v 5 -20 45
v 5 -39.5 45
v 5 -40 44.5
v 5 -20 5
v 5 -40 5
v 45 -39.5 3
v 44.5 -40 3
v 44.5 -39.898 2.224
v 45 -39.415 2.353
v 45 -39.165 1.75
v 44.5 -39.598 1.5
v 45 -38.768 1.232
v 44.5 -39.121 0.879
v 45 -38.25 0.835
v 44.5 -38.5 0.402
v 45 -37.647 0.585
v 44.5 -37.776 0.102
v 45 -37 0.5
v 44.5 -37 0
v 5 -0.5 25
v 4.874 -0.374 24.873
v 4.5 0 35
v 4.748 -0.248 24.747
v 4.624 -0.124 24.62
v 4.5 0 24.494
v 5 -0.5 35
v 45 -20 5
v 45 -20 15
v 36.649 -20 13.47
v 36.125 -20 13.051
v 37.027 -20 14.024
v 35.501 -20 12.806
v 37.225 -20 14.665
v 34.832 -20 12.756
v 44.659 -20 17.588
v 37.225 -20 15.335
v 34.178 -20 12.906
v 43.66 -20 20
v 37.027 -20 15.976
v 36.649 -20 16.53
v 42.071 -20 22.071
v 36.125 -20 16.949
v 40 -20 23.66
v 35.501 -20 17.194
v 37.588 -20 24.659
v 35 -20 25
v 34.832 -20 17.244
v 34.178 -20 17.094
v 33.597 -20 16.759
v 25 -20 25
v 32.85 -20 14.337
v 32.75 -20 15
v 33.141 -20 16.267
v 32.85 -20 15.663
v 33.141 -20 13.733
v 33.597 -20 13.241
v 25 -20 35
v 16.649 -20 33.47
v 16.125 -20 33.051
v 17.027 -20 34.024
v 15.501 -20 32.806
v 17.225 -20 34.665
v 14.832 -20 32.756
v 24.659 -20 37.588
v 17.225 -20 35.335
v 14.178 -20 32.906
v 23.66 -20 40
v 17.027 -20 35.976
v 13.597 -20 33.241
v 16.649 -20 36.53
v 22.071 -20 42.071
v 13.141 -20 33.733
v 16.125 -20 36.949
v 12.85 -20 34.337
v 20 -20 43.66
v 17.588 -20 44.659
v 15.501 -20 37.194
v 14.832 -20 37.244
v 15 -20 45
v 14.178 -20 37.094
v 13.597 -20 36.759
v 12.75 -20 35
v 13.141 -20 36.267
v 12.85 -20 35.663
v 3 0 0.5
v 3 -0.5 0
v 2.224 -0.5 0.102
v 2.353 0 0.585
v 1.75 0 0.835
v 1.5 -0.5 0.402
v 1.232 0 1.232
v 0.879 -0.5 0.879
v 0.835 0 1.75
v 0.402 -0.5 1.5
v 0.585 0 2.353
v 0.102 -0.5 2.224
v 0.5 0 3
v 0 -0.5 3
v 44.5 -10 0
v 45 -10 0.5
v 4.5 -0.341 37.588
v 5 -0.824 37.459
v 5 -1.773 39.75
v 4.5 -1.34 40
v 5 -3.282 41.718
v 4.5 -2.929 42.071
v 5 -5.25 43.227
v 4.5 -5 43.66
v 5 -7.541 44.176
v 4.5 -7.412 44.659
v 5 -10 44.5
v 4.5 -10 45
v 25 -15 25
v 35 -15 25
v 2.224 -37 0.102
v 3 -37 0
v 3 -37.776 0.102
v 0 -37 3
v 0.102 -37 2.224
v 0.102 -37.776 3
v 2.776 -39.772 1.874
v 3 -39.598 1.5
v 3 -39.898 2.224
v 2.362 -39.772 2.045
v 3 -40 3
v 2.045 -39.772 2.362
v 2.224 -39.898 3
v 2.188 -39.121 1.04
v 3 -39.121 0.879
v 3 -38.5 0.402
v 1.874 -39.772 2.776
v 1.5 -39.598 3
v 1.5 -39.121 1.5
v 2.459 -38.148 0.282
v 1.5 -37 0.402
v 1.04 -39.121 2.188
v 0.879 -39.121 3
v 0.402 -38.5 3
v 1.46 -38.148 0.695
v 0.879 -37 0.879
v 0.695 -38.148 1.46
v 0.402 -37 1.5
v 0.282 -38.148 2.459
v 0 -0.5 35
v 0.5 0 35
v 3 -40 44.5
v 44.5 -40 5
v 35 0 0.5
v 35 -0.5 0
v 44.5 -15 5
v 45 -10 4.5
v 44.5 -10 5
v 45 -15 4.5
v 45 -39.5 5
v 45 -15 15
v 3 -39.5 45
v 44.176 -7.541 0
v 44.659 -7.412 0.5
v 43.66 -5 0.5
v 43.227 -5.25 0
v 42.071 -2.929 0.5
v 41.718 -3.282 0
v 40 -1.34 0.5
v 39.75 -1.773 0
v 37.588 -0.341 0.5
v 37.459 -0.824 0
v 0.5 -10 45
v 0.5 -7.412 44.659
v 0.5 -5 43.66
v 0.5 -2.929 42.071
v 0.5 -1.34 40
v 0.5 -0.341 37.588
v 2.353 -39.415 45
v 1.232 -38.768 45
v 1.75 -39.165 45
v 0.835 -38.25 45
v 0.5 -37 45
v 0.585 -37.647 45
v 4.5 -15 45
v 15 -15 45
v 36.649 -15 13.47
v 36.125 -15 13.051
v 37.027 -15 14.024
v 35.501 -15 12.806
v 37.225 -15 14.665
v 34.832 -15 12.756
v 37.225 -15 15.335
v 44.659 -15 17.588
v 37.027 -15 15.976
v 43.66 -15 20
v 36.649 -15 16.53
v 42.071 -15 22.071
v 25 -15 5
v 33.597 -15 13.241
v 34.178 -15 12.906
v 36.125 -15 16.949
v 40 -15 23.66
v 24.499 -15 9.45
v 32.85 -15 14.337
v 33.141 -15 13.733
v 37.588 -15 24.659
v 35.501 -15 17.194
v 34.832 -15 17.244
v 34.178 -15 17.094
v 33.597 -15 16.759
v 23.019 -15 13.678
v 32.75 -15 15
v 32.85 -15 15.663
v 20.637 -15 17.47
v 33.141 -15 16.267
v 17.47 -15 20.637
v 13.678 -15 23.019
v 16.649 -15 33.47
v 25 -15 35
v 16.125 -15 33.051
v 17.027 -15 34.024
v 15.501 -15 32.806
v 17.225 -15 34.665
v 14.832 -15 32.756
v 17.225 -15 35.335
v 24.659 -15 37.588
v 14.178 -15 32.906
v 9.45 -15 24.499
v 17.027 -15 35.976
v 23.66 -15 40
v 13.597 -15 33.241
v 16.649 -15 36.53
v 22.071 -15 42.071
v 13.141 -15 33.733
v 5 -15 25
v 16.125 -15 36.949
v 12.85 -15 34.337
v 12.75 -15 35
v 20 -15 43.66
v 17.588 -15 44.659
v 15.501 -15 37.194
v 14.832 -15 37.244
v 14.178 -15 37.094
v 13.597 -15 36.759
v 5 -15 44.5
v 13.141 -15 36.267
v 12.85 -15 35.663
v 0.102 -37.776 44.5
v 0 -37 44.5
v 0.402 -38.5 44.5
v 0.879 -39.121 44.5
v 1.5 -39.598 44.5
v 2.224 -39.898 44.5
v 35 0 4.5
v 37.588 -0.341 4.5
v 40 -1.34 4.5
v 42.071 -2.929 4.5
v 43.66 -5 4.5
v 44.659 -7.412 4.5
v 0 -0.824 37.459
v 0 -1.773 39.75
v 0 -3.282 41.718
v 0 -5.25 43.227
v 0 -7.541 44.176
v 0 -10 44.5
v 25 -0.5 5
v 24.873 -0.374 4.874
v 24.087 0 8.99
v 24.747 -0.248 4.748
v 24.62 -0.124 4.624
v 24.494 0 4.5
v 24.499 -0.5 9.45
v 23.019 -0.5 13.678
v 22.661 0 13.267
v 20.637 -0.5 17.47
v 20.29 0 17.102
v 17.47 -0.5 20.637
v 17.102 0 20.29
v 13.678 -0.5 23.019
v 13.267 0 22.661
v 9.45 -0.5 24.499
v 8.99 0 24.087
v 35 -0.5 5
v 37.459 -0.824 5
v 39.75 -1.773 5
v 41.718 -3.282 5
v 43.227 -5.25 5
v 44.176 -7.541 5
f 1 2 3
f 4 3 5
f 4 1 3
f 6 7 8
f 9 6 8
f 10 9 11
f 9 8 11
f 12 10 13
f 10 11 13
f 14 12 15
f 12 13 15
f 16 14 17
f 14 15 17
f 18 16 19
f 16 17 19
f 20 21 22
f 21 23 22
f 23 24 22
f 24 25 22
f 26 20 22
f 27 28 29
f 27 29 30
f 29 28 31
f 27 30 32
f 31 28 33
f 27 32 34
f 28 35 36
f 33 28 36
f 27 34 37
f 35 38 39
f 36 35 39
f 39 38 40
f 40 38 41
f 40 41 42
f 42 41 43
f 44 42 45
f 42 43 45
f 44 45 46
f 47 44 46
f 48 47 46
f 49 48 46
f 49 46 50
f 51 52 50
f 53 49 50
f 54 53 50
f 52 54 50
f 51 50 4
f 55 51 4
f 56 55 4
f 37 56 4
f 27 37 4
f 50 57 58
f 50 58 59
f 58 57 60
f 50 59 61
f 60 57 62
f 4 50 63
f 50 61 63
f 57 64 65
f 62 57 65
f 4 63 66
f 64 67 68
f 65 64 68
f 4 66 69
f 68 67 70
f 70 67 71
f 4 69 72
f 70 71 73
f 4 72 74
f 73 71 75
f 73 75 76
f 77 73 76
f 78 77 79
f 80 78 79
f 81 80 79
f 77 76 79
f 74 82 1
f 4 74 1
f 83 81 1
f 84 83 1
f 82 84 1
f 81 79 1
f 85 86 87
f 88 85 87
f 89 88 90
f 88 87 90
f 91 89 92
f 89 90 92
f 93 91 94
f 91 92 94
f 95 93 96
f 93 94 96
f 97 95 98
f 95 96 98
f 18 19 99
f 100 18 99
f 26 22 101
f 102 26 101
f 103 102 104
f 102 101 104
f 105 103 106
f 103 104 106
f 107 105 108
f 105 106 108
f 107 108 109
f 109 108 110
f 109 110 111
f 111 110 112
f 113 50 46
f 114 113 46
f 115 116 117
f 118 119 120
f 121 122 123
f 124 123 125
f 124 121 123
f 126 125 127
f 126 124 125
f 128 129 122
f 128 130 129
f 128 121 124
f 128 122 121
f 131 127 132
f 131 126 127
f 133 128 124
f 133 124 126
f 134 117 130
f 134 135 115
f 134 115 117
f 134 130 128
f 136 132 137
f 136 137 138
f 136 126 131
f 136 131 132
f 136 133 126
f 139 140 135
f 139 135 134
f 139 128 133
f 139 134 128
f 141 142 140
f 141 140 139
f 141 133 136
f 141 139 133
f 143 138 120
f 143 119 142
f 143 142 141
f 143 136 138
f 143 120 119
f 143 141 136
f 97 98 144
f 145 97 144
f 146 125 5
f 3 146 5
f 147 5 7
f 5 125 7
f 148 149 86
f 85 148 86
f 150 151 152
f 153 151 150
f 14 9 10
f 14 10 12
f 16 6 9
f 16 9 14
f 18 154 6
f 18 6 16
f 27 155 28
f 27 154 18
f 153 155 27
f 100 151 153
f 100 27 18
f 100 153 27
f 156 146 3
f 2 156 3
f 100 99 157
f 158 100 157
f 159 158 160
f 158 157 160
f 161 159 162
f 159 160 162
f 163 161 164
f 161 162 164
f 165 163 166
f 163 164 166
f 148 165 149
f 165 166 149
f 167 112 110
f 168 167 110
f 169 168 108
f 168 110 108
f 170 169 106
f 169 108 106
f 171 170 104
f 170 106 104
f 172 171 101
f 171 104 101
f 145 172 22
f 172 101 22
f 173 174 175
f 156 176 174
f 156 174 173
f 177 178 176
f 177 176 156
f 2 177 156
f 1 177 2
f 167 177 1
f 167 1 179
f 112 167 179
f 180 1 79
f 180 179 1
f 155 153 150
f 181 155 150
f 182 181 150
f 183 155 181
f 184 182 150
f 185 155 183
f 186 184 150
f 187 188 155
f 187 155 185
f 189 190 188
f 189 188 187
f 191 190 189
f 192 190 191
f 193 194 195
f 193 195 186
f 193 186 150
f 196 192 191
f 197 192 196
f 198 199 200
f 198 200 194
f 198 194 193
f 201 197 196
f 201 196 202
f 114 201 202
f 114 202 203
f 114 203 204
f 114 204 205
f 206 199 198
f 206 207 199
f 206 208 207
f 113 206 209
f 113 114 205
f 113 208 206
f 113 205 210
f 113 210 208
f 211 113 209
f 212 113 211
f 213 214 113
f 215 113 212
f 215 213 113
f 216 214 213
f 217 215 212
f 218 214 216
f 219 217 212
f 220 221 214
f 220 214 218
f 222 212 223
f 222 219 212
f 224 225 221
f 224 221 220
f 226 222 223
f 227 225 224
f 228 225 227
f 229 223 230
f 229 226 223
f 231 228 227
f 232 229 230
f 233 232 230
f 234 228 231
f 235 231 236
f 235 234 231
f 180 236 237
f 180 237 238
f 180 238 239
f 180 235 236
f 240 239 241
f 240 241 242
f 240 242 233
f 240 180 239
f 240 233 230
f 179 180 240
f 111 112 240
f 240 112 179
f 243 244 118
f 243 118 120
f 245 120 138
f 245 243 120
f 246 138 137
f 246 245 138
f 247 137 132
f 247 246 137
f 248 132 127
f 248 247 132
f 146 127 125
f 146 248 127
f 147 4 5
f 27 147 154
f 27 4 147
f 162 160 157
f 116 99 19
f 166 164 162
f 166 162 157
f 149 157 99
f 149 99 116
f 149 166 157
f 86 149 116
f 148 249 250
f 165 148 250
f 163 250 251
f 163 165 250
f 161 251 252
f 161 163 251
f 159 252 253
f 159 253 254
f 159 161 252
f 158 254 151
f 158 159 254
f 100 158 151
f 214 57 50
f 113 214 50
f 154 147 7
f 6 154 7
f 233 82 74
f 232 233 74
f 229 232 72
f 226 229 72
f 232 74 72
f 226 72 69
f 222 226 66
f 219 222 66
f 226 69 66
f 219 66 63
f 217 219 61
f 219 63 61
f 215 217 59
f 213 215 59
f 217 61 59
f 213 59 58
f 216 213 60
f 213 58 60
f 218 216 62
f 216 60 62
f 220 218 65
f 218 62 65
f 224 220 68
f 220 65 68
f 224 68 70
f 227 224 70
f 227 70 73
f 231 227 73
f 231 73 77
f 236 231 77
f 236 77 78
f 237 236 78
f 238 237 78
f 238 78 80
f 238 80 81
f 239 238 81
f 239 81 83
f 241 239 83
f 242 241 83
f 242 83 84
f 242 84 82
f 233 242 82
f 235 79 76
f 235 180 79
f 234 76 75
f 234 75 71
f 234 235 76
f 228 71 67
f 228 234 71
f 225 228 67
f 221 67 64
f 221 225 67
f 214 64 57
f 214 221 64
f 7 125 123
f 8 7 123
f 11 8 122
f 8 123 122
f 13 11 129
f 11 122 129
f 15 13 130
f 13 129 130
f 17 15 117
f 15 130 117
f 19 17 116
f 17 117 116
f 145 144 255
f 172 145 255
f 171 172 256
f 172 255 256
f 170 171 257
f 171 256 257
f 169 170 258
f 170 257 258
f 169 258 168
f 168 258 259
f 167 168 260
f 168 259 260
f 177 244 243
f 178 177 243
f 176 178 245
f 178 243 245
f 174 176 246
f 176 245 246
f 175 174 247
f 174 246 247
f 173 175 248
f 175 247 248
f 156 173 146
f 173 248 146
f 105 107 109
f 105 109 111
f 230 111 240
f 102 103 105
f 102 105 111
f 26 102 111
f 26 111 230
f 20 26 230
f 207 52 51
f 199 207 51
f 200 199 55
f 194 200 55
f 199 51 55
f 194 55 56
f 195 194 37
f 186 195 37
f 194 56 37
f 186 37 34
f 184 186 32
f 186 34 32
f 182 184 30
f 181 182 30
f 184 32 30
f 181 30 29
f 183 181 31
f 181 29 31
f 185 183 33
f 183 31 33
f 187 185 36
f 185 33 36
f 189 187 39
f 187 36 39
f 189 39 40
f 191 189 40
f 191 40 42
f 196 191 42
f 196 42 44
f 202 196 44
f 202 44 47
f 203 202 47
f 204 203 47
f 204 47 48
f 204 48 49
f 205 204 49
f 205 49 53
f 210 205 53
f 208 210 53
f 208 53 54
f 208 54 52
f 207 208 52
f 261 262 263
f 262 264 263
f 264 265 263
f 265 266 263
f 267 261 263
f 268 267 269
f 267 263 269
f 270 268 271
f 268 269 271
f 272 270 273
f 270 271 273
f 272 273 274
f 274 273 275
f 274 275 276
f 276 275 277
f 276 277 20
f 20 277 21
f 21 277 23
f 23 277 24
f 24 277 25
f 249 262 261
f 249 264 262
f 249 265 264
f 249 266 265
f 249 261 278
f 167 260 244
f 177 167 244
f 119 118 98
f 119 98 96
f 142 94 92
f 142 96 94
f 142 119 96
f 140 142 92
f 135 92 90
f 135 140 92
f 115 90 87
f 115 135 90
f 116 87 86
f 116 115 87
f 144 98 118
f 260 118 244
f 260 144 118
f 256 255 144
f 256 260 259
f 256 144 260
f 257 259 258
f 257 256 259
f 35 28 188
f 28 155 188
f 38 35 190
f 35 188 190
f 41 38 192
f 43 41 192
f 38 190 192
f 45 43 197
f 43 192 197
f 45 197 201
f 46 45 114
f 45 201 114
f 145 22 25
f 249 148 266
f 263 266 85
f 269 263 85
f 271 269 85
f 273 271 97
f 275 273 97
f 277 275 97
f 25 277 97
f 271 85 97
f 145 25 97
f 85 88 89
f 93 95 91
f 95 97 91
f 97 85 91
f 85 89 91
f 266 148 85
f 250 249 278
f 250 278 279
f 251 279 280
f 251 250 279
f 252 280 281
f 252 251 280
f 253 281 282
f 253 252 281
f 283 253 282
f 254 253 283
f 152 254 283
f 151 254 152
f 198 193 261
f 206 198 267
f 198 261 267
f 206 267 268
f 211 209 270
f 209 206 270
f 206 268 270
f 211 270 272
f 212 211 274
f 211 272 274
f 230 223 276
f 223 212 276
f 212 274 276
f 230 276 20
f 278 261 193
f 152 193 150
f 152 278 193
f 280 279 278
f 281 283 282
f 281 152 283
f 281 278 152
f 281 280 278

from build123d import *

# Parameters (mm, degrees)
BOSS_EXTRUDE1_DEPTH  = 40
BOSS_EXTRUDE2_START  = -20
BOSS_EXTRUDE2_DEPTH  = 5
FILLET1_R            = 10
FILLET2_R            = 3
M4_CLEARANCE_HOLE1_D = 4.5
BOSS_EXTRUDE3_REACH  = 42
CHAMFER1_SIZE        = 0.5


with BuildPart() as part:
    # Sketch1 → Boss-Extrude1 (new body)
    with BuildSketch(Plane(origin=(0, 0, 0), x_dir=(1, 0, 0), z_dir=(0, 1, 0))):
        Polygon((0, 0), (0, -45), (5, -45), (5, -5), (45, -5), (45, 0), align=None)
    extrude(amount=-BOSS_EXTRUDE1_DEPTH)

    # Sketch2 → Boss-Extrude2 (add)
    with BuildSketch(Plane.XZ.offset(40).offset(BOSS_EXTRUDE2_START)):
        Polygon((5, 45), (25, 45), (25, 25), (45, 25), (45, 5), (5, 5), align=None)
    extrude(amount=-BOSS_EXTRUDE2_DEPTH)

    # Fillet1
    fillet1_edges = [part.edges().sort_by_distance(p)[0] for p in [
        (25, -17.5, 45),
        (45, -17.5, 25),
        (45, 0, 2.5),
        (2.5, 0, 45),
    ]]
    fillet(fillet1_edges, radius=FILLET1_R)

    # Fillet2
    fillet2_edges = [part.edges().sort_by_distance(p)[0] for p in [
        (0, -20, 0),
        (22.5, -40, 0),
        (0, -40, 22.5),
    ]]
    fillet(fillet2_edges, radius=FILLET2_R)

    # M4 Clearance Hole1 (through all)
    with Locations(Plane(origin=(0, -15, 0), x_dir=(1, 0, 0), z_dir=(0, 1, 0))):
        with Locations((35, -15), (15, -35)):
            Hole(M4_CLEARANCE_HOLE1_D / 2)

    # Sketch5 → Boss-Extrude3 (add, up to next)
    with BuildSketch(Plane(origin=(0, 0, 0), x_dir=(1, 0, 0), z_dir=(0, 1, 0)), mode=Mode.PRIVATE) as boss_extrude3_sk1:
        with BuildLine():
            Line((5, -25), (5, -5))
            Line((5, -5), (25, -5))
            ThreePointArc((25, -5), (19.142135624, -19.142135624), (5, -25))
        make_face()
    boss_extrude3_tool1 = extrude(boss_extrude3_sk1.sketch, amount=-BOSS_EXTRUDE3_REACH, mode=Mode.PRIVATE) - part.part
    add(boss_extrude3_tool1.solids().sort_by_distance((13.488264, 0, 13.488264))[0])

    # Chamfer1
    chamfer1_edges = [part.edges().sort_by_distance(p)[0] for p in [
        (4, -40, 45),
        (45, -40, 4),
        (0.878679656, -39.121320344, 45),
        (45, -39.121320344, 0.878679656),
        (0, -23.5, 45),
        (45, -23.5, 0),
        (0, -2.928932188, 42.071067812),
        (42.071067812, -2.928932188, 0),
        (0, 0, 19),
        (0.878679656, 0, 0.878679656),
        (19, 0, 0),
        (5, -12.5, 45),
        (45, -12.5, 5),
        (5, -2.928932188, 42.071067812),
        (42.071067812, -2.928932188, 5),
        (5, 0, 30),
        (30, 0, 5),
        (19.142135624, 0, 19.142135624),
    ]]
    chamfer(chamfer1_edges, length=CHAMFER1_SIZE)


solid = part.part
